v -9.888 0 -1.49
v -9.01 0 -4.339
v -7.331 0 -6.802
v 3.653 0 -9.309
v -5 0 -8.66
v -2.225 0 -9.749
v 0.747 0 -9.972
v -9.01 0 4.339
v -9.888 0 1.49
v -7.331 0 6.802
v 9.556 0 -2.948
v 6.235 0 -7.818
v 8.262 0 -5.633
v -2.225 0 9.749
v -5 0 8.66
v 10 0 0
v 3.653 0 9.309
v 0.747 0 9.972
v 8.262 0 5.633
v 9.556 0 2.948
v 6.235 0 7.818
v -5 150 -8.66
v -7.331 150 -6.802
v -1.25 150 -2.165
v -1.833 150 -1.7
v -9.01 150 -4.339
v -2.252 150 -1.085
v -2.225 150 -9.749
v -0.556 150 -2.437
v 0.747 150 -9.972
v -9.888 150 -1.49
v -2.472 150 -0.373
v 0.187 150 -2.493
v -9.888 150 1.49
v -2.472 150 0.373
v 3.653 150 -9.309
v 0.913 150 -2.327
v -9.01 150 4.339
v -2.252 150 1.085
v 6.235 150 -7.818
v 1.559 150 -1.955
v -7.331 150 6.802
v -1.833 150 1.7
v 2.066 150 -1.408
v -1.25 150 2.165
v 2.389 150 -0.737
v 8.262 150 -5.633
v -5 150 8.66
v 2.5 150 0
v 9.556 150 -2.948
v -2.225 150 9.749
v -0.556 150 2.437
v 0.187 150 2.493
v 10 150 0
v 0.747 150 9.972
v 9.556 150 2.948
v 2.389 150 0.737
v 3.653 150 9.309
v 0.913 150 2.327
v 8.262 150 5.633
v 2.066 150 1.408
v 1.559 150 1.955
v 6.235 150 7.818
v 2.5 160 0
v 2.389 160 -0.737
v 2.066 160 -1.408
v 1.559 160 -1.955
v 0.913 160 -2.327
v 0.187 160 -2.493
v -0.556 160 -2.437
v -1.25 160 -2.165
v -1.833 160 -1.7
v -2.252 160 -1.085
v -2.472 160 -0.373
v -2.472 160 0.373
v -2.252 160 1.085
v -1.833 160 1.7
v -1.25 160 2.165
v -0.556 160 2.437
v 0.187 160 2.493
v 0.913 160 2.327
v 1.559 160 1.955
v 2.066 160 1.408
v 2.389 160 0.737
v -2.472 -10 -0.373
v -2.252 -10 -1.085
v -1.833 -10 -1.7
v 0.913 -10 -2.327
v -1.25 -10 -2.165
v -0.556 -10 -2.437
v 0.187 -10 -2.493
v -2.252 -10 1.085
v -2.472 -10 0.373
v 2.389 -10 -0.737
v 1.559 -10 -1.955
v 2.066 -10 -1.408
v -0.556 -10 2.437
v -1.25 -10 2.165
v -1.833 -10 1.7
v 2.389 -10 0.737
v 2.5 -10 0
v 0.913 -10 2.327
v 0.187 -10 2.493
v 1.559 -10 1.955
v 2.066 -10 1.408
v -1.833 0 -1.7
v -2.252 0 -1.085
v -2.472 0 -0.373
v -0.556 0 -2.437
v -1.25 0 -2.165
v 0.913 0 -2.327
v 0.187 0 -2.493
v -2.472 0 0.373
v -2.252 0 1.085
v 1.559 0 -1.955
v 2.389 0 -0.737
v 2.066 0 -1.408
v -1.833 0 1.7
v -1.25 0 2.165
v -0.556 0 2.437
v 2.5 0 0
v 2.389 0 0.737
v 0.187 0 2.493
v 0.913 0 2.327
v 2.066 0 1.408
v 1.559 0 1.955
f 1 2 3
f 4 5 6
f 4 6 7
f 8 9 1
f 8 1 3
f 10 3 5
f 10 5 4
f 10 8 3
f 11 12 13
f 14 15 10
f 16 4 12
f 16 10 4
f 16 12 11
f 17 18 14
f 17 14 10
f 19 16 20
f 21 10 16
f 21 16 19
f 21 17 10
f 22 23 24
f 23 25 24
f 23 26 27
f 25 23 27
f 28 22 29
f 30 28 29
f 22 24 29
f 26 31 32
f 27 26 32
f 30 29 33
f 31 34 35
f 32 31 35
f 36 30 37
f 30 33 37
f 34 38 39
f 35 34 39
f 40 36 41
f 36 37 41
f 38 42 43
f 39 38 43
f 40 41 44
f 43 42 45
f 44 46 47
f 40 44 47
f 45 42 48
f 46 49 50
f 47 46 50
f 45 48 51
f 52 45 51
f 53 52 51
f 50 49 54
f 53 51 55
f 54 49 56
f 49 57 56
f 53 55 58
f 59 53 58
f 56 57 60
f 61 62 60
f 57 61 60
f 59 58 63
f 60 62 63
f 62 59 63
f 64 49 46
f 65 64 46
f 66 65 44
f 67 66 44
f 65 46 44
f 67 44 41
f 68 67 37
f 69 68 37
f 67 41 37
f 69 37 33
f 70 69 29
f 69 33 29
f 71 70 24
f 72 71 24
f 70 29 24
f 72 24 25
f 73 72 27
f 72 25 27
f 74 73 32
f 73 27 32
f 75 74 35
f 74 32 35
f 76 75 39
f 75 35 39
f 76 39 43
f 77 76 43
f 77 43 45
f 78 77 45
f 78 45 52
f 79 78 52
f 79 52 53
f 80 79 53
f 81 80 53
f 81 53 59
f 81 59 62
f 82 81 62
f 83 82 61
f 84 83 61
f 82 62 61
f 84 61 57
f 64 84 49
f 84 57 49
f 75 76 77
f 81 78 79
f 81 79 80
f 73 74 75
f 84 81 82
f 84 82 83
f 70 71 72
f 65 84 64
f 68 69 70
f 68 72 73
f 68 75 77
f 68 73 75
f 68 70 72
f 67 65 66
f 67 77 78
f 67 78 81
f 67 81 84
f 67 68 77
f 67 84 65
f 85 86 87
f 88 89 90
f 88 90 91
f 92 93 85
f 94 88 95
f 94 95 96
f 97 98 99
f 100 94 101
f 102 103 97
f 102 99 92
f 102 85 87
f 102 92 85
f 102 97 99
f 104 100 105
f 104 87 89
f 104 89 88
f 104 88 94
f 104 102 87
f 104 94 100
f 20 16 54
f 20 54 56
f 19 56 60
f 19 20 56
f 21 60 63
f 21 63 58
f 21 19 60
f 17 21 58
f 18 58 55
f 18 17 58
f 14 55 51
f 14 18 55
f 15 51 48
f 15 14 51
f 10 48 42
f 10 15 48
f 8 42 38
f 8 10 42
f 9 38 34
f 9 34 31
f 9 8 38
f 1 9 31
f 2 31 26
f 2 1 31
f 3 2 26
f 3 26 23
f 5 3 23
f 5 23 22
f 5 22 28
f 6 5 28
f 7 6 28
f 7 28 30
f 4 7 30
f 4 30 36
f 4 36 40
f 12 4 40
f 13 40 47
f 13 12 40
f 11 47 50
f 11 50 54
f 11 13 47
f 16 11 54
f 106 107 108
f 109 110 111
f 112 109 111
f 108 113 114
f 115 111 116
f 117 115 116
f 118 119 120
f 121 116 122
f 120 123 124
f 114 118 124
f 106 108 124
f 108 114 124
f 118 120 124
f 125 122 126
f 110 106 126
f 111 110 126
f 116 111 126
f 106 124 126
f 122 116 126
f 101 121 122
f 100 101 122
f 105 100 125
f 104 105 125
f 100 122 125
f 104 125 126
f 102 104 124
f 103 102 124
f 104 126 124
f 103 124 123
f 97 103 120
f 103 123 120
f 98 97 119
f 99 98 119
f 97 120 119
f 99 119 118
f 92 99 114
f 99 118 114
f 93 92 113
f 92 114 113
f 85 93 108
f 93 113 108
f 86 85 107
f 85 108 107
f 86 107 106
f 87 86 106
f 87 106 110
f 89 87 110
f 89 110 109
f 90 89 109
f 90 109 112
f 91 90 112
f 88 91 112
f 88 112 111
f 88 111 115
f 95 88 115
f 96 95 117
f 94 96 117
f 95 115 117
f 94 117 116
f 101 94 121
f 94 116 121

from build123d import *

# Parameters (mm, degrees)
F0_R     = 10
F1_DEPTH = 150
F3_R     = 2.5
F4_DEPTH = 10
F6_R     = 2.5
F7_DEPTH = 10


with BuildPart() as f1:
    # F0 (on Front) → F1 (new body)
    with BuildSketch(Plane.XZ):
        Circle(F0_R)
    extrude(amount=-F1_DEPTH)

    # F6 (on offset) → F7 (join)
    with BuildSketch(Plane(origin=(0, 150, 0), x_dir=(1, 0, 0), z_dir=(0, 1, 0))):
        Circle(F6_R)
    extrude(amount=F7_DEPTH)


with BuildPart() as f4:
    # F3 (on offset) → F4 (new body)
    with BuildSketch(Plane.XZ):
        Circle(F3_R)
    extrude(amount=F4_DEPTH)


solid = Compound([f1.part, f4.part])
